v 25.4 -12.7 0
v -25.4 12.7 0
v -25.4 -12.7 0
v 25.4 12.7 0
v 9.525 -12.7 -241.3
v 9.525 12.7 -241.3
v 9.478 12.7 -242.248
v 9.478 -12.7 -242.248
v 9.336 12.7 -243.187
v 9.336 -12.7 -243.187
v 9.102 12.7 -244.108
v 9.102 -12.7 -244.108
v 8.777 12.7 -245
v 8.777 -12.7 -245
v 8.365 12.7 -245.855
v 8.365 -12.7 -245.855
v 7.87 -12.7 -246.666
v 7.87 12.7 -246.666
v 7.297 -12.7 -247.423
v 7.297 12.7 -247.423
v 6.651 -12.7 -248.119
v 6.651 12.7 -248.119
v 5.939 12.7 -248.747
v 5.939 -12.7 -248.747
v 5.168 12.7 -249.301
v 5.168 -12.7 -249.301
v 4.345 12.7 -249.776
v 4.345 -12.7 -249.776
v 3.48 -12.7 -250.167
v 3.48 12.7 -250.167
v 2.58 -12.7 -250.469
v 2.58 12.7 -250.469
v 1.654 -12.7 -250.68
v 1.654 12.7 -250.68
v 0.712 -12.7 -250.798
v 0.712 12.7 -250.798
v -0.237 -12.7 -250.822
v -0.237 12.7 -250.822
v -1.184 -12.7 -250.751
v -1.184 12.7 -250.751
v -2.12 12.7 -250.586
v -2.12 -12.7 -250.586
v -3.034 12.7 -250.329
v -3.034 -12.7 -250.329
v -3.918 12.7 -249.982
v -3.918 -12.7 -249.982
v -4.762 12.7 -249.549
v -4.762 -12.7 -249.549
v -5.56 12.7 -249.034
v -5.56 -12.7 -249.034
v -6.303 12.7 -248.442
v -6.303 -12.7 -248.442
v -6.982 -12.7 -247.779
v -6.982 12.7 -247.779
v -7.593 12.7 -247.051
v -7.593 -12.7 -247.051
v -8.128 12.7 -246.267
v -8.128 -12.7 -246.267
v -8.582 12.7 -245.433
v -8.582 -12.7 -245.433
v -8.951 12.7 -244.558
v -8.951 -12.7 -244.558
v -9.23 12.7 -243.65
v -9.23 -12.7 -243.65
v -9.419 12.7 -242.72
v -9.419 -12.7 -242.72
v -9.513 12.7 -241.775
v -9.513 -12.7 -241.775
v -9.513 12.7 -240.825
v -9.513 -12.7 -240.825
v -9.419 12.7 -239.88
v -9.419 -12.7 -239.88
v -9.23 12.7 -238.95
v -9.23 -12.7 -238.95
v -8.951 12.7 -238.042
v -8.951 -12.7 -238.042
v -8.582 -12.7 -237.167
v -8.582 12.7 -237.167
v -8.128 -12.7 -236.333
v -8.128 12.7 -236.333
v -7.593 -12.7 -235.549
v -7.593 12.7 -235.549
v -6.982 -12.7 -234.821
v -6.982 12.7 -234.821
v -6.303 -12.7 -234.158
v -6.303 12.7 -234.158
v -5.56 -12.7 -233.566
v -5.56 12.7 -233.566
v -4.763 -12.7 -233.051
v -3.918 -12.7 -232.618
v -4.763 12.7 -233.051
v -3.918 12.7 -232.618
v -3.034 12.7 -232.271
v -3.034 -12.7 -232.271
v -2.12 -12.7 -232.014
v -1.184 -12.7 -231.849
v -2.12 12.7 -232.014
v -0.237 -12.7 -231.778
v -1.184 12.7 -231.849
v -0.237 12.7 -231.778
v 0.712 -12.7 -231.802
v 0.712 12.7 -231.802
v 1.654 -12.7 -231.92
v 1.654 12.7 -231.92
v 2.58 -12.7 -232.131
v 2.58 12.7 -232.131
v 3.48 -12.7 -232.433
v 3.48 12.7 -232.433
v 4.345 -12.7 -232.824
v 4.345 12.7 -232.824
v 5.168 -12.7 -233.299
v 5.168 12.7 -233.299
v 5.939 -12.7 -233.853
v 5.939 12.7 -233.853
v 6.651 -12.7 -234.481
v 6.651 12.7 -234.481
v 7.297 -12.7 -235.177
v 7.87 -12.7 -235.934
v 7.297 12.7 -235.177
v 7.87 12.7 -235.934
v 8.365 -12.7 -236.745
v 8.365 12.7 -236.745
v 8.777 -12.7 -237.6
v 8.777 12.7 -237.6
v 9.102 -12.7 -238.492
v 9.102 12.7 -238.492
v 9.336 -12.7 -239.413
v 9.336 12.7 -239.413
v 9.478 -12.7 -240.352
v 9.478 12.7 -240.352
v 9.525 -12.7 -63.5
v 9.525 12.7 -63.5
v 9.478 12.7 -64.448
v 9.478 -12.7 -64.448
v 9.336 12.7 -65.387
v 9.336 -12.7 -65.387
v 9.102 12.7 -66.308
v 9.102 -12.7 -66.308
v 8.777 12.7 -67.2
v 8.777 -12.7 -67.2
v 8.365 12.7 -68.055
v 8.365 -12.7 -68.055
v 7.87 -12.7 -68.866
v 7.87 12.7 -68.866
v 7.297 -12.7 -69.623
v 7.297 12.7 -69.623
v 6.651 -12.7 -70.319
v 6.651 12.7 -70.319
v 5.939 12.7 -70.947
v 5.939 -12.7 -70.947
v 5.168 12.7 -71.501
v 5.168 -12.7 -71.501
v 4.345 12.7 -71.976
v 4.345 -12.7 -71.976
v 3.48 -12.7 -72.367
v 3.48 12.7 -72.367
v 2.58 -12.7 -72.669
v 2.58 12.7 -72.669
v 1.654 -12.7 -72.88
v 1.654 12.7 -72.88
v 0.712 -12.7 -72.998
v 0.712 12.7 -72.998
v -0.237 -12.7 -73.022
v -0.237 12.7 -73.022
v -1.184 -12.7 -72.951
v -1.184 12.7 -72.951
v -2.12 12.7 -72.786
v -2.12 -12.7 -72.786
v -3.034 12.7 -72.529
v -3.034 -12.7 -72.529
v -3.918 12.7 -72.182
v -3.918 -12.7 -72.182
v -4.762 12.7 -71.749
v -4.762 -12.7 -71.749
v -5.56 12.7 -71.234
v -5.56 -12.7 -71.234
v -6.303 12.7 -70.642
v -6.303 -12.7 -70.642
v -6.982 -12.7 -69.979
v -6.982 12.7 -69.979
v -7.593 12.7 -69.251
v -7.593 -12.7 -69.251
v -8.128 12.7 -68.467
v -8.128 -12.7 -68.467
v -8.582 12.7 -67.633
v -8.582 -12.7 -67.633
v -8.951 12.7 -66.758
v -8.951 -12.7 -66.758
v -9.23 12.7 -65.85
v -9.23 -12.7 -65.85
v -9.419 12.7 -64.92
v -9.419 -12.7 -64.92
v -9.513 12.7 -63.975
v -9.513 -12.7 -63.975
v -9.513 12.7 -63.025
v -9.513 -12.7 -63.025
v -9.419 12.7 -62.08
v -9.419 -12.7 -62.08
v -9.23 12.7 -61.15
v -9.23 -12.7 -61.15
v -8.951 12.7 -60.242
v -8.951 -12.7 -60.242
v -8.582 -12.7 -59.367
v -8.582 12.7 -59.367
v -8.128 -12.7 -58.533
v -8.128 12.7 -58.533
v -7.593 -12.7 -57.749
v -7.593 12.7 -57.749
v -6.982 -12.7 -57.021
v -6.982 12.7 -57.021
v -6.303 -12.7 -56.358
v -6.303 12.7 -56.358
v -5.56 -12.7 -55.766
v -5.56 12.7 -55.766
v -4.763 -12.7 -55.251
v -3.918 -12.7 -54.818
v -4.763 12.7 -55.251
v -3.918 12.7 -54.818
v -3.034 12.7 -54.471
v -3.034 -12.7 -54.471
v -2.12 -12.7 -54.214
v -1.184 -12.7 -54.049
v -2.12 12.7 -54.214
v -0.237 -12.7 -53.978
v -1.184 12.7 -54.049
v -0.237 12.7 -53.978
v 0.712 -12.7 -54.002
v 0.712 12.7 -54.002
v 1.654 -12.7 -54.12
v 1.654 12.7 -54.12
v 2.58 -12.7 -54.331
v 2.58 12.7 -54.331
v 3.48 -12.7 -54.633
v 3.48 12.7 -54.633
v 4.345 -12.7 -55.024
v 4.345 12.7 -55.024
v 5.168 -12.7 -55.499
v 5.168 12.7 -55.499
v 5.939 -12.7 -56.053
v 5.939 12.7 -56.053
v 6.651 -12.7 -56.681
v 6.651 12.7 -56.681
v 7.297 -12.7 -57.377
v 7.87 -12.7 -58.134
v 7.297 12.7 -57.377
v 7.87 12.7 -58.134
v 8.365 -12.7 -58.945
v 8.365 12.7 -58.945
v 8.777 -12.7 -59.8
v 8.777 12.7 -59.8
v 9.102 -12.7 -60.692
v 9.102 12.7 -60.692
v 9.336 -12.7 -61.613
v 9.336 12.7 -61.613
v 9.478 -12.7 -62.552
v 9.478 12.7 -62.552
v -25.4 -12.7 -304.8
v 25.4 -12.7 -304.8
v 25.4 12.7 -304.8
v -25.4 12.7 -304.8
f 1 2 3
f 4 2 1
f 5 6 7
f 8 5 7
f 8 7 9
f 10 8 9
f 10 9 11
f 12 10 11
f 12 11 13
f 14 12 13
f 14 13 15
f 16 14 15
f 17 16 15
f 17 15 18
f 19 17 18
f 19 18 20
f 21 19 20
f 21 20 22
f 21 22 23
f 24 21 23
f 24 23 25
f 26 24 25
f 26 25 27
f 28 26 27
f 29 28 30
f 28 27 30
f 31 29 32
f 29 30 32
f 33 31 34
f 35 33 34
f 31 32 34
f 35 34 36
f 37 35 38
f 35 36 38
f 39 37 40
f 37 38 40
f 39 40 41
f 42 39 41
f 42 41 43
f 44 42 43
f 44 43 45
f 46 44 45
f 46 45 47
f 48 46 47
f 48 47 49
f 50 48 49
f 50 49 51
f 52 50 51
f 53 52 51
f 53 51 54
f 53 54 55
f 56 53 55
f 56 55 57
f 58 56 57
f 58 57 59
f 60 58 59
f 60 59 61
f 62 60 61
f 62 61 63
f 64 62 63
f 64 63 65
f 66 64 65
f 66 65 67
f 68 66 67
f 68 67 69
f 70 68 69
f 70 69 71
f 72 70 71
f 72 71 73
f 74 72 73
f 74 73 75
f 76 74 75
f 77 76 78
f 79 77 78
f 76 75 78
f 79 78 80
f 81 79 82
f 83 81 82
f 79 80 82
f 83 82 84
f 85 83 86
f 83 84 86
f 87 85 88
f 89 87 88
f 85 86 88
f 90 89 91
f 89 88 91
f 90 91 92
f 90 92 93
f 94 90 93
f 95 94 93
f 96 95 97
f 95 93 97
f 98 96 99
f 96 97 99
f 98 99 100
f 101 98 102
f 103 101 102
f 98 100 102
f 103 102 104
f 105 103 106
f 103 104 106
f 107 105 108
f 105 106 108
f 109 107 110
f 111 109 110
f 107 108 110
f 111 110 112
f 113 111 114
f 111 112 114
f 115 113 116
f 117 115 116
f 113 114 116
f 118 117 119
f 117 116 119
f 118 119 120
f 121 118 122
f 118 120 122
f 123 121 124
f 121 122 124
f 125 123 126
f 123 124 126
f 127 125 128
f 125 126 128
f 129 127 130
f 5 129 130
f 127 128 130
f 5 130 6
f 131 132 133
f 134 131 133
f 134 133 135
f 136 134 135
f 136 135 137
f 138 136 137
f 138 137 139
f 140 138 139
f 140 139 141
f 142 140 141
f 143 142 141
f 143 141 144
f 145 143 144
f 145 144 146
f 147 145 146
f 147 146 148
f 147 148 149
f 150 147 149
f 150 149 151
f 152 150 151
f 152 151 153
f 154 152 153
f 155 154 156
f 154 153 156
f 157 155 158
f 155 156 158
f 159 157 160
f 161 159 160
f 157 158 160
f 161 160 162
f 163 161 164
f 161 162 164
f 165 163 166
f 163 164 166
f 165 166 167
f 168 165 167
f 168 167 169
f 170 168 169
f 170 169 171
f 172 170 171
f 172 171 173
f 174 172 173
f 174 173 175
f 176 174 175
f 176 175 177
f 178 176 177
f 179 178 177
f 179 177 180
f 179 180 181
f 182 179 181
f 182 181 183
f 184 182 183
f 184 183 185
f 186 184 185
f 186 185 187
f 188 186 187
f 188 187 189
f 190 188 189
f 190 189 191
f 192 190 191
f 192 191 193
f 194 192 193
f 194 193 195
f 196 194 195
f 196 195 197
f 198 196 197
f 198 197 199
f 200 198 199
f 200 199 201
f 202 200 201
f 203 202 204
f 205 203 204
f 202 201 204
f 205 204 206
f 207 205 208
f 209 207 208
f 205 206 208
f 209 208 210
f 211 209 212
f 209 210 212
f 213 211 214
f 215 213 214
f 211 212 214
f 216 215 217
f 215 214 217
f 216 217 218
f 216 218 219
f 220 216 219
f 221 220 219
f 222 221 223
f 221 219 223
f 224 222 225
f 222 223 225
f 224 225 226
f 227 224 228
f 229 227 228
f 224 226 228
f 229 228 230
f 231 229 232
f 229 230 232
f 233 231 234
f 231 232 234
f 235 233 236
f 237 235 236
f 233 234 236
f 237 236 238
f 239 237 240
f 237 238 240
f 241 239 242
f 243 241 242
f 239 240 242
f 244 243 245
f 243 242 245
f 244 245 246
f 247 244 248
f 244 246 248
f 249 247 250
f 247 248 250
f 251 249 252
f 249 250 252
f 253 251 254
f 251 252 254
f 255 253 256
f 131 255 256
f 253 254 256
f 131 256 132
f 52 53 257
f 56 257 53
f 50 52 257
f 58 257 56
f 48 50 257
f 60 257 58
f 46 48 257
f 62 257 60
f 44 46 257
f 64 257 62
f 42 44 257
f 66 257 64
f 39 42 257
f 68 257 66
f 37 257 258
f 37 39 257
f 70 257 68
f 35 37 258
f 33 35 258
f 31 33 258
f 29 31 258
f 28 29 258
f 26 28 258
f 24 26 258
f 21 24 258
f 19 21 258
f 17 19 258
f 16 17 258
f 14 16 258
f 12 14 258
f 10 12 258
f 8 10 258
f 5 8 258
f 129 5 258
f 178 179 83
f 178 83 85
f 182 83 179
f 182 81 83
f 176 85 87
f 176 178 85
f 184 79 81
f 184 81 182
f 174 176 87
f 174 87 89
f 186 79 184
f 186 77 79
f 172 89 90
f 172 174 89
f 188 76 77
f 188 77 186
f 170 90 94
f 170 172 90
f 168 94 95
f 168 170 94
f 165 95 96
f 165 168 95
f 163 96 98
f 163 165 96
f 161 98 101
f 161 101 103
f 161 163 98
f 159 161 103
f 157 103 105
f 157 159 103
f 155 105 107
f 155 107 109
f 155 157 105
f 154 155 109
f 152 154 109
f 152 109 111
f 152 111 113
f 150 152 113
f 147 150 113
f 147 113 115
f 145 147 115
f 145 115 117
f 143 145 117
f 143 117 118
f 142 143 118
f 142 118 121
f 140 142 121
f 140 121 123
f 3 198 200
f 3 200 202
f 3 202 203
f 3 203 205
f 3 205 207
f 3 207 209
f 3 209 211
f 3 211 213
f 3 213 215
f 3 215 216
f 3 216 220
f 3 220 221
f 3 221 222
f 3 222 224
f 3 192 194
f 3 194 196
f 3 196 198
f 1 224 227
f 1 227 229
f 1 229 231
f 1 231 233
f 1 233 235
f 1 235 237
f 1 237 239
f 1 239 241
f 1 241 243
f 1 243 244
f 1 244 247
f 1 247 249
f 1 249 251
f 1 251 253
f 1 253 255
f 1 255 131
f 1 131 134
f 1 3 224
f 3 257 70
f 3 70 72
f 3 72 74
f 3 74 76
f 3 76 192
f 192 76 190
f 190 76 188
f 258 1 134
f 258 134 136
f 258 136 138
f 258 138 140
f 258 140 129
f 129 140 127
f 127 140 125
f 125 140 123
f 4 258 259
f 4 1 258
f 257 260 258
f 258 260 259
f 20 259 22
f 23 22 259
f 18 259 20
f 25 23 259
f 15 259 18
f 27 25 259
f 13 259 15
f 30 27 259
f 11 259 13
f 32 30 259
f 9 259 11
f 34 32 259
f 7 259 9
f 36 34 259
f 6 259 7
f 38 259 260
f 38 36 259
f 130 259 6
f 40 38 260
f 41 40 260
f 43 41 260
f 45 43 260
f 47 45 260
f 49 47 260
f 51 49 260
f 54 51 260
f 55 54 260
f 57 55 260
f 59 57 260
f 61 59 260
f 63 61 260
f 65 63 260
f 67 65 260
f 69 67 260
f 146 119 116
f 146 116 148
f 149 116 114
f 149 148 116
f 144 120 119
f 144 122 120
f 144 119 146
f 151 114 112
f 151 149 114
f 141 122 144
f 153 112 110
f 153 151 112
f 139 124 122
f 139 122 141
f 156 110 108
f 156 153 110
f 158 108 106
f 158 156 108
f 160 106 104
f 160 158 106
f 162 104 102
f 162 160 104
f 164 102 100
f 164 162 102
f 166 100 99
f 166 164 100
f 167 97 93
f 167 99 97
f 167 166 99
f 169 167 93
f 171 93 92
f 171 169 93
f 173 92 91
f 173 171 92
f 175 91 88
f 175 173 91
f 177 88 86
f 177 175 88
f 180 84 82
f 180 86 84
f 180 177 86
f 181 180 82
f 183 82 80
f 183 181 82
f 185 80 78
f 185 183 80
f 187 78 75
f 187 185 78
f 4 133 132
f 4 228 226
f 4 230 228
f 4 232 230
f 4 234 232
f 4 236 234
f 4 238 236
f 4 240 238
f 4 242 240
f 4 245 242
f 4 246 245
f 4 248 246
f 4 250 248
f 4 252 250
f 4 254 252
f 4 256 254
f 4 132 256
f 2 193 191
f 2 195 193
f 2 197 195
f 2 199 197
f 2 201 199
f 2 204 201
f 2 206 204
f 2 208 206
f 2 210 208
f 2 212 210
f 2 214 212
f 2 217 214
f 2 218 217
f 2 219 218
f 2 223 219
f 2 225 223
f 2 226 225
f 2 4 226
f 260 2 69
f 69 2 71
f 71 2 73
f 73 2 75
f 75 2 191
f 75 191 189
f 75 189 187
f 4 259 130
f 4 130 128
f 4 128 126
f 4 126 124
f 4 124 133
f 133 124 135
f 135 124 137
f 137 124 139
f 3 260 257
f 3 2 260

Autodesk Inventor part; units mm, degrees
ref_plane "YZ Plane" through (0, 0, 0) normal (1, 0, 0) x (0, 1, 0)
ref_plane "XZ Plane" through (0, 0, 0) normal (0, 1, 0) x (-1, 0, 0)
ref_plane "XY Plane" through (0, 0, 0) normal (0, 0, 1) x (1, 0, 0)
sketch "Sketch1" plane through (0, 0, 0) normal (0, 0, 1) x (1, 0, 0)
  line L0 (-25.4, -12.7) -> (25.4, -12.7)
  line L1 (25.4, -12.7) -> (25.4, 12.7)
  line L2 (25.4, 12.7) -> (-25.4, 12.7)
  line L3 (-25.4, 12.7) -> (-25.4, -12.7)
  line L4 (-25.4, -12.7) -> (25.4, 12.7) construction
  line L5 (25.4, -12.7) -> (-25.4, 12.7) construction
  point P0 (0, 0)
  dimension "d0" = 25.4
  dimension "d1" = 50.8
extrude "Extrusion1" add sketch "Sketch1" against normal blind 304.8
sketch "Sketch2" plane through (-25.4, 12.7, 0) normal (0, 1, 0) x (1, 0, 0)
  circle A0 centre (25.4, 63.5) radius 9.525
  circle A1 centre (25.4, 241.3) radius 9.525
  line L0 (50.8, 0) -> (0, 0) projected
  line L1 (0, 0) -> (0, 304.8) projected
  point P0 (25.4, 0)
  point P1 (25.4, 0)
  point P2 (0, 152.4)
  dimension "d4" = 177.8
  dimension "d5" = 88.9
  dimension "d6" = 19.05
extrude "Extrusion2" cut sketch "Sketch2" against normal blind 254
properties part number "Metal Bar-1"
